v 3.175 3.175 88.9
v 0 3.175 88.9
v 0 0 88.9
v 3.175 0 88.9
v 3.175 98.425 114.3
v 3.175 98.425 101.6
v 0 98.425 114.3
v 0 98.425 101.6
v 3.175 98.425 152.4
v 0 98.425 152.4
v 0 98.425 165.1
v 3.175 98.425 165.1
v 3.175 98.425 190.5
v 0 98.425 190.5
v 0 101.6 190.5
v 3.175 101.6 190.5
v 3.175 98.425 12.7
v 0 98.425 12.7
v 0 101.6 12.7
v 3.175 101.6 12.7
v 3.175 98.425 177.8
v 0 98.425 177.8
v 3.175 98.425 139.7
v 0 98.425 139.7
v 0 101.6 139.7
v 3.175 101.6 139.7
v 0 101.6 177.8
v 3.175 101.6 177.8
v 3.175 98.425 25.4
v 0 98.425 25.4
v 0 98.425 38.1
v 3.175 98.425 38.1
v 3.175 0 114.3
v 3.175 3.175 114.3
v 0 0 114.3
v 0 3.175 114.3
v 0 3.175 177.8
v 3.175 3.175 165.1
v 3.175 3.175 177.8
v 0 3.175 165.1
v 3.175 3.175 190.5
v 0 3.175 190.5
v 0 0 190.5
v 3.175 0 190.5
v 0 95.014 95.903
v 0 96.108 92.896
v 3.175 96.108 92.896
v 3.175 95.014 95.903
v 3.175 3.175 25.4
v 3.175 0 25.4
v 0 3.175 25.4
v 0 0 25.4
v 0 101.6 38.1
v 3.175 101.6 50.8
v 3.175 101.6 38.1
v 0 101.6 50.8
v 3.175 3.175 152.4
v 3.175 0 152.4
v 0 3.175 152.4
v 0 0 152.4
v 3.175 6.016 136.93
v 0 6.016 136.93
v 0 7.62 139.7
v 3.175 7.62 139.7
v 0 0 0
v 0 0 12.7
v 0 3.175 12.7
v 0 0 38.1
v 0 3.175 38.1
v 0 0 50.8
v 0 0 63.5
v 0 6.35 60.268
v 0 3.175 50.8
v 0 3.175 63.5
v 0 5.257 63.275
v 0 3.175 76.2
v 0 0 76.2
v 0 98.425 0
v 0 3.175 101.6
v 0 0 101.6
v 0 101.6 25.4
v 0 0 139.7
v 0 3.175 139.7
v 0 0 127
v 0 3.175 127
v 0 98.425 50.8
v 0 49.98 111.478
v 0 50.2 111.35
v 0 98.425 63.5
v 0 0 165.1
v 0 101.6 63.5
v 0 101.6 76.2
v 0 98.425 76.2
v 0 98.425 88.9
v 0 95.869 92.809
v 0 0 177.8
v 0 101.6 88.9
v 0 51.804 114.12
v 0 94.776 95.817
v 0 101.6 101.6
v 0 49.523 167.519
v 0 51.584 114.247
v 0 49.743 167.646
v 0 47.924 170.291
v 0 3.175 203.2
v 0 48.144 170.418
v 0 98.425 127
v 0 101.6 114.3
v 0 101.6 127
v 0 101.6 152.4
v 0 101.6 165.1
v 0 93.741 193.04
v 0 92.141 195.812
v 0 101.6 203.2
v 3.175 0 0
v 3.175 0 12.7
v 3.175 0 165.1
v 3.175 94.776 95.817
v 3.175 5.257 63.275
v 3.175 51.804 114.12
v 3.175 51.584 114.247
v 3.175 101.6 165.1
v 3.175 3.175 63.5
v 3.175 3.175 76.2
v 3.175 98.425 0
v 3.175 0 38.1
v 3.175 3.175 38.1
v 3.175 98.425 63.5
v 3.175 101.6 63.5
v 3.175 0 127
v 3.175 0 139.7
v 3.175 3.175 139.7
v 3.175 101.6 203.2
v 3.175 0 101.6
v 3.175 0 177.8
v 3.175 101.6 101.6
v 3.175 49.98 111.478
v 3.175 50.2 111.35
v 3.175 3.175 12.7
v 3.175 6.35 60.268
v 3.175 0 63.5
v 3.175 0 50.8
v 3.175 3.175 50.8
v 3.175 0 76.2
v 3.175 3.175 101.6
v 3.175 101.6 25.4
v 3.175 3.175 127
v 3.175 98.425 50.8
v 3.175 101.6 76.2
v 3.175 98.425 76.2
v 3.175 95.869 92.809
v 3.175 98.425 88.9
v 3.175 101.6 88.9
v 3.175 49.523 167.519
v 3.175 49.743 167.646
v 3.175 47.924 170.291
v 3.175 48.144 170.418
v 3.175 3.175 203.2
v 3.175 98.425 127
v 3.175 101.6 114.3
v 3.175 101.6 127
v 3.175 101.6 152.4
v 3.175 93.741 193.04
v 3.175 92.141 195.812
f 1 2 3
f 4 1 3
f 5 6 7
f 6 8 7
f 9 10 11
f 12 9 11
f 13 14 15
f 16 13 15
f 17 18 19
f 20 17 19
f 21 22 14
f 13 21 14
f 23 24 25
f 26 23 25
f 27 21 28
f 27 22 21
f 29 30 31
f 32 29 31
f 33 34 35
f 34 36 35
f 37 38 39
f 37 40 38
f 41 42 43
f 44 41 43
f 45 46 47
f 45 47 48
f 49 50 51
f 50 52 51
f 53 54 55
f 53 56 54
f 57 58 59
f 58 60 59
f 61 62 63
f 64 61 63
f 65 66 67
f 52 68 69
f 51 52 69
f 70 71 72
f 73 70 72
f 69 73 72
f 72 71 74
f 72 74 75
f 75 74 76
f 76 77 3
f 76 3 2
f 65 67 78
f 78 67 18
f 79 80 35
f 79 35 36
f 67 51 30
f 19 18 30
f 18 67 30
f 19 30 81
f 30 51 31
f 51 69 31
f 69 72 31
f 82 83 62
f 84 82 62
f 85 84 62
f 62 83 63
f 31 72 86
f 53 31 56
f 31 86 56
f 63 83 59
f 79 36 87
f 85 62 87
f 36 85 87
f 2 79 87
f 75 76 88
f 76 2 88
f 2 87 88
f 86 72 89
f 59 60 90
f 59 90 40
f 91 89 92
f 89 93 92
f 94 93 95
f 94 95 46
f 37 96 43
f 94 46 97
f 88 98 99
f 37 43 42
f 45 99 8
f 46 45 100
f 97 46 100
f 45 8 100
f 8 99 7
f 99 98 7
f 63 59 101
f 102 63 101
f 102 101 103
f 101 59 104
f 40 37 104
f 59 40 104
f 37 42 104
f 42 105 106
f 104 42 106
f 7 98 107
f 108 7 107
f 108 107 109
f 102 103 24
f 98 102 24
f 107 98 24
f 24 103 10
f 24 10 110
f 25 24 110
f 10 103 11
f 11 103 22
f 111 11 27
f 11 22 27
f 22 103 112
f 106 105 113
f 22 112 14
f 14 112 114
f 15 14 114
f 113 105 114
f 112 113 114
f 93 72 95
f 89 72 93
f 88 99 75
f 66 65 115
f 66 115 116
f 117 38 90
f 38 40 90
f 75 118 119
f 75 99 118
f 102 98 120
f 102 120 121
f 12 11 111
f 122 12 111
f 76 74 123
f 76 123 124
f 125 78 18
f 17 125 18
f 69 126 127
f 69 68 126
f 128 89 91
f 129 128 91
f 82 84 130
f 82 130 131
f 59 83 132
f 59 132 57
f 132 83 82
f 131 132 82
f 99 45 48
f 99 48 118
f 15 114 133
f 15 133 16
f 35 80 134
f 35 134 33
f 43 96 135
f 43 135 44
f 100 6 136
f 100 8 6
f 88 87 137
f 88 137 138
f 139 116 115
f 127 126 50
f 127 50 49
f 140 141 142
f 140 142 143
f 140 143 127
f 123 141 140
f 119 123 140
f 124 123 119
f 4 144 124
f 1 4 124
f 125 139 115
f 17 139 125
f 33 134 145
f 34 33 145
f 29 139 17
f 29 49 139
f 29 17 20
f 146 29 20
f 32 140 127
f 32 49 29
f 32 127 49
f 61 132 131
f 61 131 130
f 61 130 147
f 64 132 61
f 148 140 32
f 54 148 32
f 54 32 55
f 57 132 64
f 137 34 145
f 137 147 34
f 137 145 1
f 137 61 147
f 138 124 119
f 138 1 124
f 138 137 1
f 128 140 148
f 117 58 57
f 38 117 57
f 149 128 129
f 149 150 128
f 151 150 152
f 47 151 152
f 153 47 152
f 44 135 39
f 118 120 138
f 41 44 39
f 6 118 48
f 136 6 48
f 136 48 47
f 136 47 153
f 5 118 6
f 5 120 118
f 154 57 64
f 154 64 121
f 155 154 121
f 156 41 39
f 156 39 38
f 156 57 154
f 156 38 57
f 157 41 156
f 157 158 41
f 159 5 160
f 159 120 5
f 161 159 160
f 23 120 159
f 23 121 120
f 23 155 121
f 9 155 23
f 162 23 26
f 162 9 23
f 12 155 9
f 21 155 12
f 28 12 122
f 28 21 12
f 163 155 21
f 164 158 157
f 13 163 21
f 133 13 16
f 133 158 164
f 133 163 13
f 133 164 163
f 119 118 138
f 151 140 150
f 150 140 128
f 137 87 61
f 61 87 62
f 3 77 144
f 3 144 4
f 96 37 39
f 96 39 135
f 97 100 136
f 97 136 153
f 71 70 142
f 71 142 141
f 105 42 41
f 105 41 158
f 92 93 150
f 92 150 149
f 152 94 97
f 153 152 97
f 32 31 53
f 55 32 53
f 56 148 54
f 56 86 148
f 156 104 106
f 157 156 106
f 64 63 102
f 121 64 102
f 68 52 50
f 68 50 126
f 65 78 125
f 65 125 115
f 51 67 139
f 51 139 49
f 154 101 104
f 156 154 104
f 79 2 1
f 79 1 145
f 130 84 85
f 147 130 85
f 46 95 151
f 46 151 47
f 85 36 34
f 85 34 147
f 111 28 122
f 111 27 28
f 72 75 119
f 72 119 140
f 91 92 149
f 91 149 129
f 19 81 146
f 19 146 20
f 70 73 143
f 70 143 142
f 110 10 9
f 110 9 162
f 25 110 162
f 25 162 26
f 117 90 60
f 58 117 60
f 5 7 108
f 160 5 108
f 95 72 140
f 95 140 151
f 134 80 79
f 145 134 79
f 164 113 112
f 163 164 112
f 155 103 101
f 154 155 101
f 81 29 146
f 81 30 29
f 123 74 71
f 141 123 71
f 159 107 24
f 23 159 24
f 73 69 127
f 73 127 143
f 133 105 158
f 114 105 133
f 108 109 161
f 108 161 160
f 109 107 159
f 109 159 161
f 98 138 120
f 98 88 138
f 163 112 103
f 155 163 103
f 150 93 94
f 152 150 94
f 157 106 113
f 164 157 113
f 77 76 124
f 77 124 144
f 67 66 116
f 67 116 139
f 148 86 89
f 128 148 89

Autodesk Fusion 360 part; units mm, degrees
sketch "Sketch1" plane through (0, 0, 0) normal (1, 0, 0) x (0, 1, 0)
  line L0 (98.425, 139.7) -> (101.6, 139.7)
  line L1 (0, 101.6) -> (0, 114.3)
  line L2 (0, 127) -> (0, 139.7)
  line L3 (98.425, 114.3) -> (101.6, 114.3)
  line L4 (0, 127) -> (3.175, 127)
  line L5 (101.6, 101.6) -> (101.6, 88.9)
  line L6 (0, 101.6) -> (3.175, 101.6)
  line L7 (98.425, 0) -> (98.425, 203.2)
  line L8 (98.425, 114.3) -> (98.425, 101.6)
  line L9 (98.425, 88.9) -> (101.6, 88.9)
  line L10 (101.6, 0) -> (100.0125, 0)
  line L11 (98.425, 127) -> (101.6, 127)
  line L12 (98.425, 101.6) -> (101.6, 101.6)
  line L13 (98.425, 95.25) -> (98.425, 88.9)
  line L14 (3.175, 0) -> (3.175, 203.2)
  line L15 (101.6, 127) -> (101.6, 114.3)
  line L16 (3.175, 127) -> (3.175, 114.3)
  line L17 (3.175, 88.9) -> (0, 88.9)
  line L18 (98.425, 139.7) -> (98.425, 127)
  line L19 (3.175, 114.3) -> (0, 114.3)
  line L20 (3.175, 12.7) -> (3.175, 0)
  line L21 (3.175, 190.5) -> (3.175, 177.8)
  line L22 (3.175, 177.8) -> (0, 177.8)
  line L23 (101.6, 50.8) -> (101.6, 38.1)
  line L24 (3.175, 50.8) -> (3.175, 38.1)
  line L25 (98.425, 152.4) -> (101.6, 152.4)
  line L26 (98.425, 50.8) -> (101.6, 50.8)
  line L27 (98.425, 152.4) -> (98.425, 139.7)
  line L28 (3.175, 139.7) -> (0, 139.7)
  line L29 (0, 139.7) -> (0, 127)
  line L30 (3.175, 101.6) -> (3.175, 88.9)
  line L31 (98.425, 101.6) -> (98.425, 95.25)
  line L32 (98.425, 203.2) -> (98.425, 190.5)
  line L33 (101.6, 152.4) -> (101.6, 139.7)
  line L34 (101.6, 203.2) -> (101.6, 190.5)
  line L35 (3.175, 203.2) -> (3.175, 190.5)
  line L36 (0, 0) -> (11.0998, 0)
  line L37 (98.425, 177.8) -> (98.425, 165.1)
  line L38 (98.425, 127) -> (98.425, 114.3)
  line L39 (0, 165.1) -> (0, 152.4)
  line L40 (11.0998, 0) -> (6.0198, 0)
  line L41 (98.425, 88.9) -> (98.425, 76.2)
  line L42 (0, 38.1) -> (3.175, 38.1)
  line L43 (98.425, 38.1) -> (98.425, 25.4)
  line L44 (101.6, 177.8) -> (101.6, 165.1)
  line L45 (98.425, 12.7) -> (101.6, 12.7)
  line L46 (0, 177.8) -> (0, 190.5)
  line L47 (98.425, 177.8) -> (101.6, 177.8)
  line L48 (0, 76.2) -> (0, 88.9)
  line L49 (0, 114.3) -> (0, 101.6)
  line L50 (3.175, 190.5) -> (0, 190.5)
  line L51 (98.425, 190.5) -> (101.6, 190.5)
  line L52 (101.6, 0) -> (0, 0)
  line L53 (98.425, 38.1) -> (101.6, 38.1)
  line L54 (90.5002, 0) -> (95.5802, 0)
  line L55 (3.175, 203.2) -> (101.6, 203.2)
  line L56 (98.425, 76.2) -> (101.6, 76.2)
  line L57 (98.425, 165.1) -> (101.6, 165.1)
  line L58 (98.425, 63.5) -> (98.425, 50.8)
  line L59 (98.425, 25.4) -> (101.6, 25.4)
  line L60 (0, 0) -> (0, 12.7)
  line L61 (3.175, 63.5) -> (0, 63.5)
  line L62 (98.425, 63.5) -> (101.6, 63.5)
  line L63 (0, 152.4) -> (0, 165.1)
  line L64 (0, 152.4) -> (3.175, 152.4)
  line L65 (0, 25.4) -> (0, 38.1)
  line L66 (0, 0) -> (12.065, 0)
  line L67 (3.175, 50.8) -> (0, 50.8)
  line L68 (101.6, 203.2) -> (98.425, 203.2)
  line L69 (98.425, 190.5) -> (98.425, 177.8)
  line L70 (101.6, 76.2) -> (101.6, 63.5)
  line L71 (101.6, 0) -> (90.5002, 0)
  line L72 (3.175, 25.4) -> (3.175, 12.7)
  line L73 (98.425, 25.4) -> (98.425, 12.7)
  line L74 (3.175, 38.1) -> (3.175, 25.4)
  line L75 (0, 12.7) -> (3.175, 12.7)
  line L76 (0, 50.8) -> (0, 63.5)
  line L77 (0, 25.4) -> (3.175, 25.4)
  line L78 (3.175, 177.8) -> (3.175, 165.1)
  line L79 (101.6, 0) -> (98.425, 0)
  line L80 (101.6, 0) -> (85.725, 0)
  line L81 (101.6, 25.4) -> (101.6, 12.7)
  line L82 (3.175, 76.2) -> (0, 76.2)
  line L83 (98.425, 165.1) -> (98.425, 152.4)
  line L84 (3.175, 63.5) -> (3.175, 50.8)
  line L85 (3.175, 152.4) -> (3.175, 139.7)
  line L86 (98.425, 76.2) -> (98.425, 63.5)
  line L87 (3.175, 165.1) -> (0, 165.1)
  line L88 (98.425, 50.8) -> (98.425, 38.1)
  line L89 (3.175, 76.2) -> (3.175, 63.5)
  line L90 (0, 0) -> (3.175, 0)
  line L91 (3.175, 88.9) -> (3.175, 76.2)
  line L92 (98.425, 203.2) -> (98.425, 177.8)
  line L93 (3.175, 0) -> (3.175, 59.055)
  line L94 (7.62, 139.7) -> (51.5837, 114.2474)
  line L95 (49.9801, 111.4777) -> (6.0165, 136.9303)
  line L96 (6.0165, 136.9303) -> (7.62, 139.7)
  line L97 (93.7411, 193.04) -> (49.7434, 167.6463)
  line L98 (92.1413, 195.8119) -> (93.7411, 193.04)
  line L99 (48.1436, 170.4182) -> (92.1413, 195.8119)
  line L100 (3.175, 60.2676) -> (4.1957, 60.2676)
  line L101 (4.1957, 60.2676) -> (6.35, 60.2676)
  line L102 (6.35, 60.2676) -> (95.8689, 92.8088)
  line L103 (94.7755, 95.8167) -> (5.2566, 63.2754)
  line L104 (49.9801, 111.4777) -> (50.2, 111.3504)
  line L105 (50.2, 111.3504) -> (51.8035, 114.1201)
  line L106 (51.8035, 114.1201) -> (51.5837, 114.2474)
  line L107 (95.8689, 92.8088) -> (96.1076, 92.8956)
  line L108 (96.1076, 92.8956) -> (95.0142, 95.9034)
  line L109 (95.0142, 95.9034) -> (94.7755, 95.8167)
  line L110 (49.7434, 167.6463) -> (49.5234, 167.5194)
  line L111 (49.5234, 167.5194) -> (47.9236, 170.2912)
  line L112 (47.9236, 170.2912) -> (48.1436, 170.4182)
  line L113 (5.2566, 63.2754) -> (6.35, 60.2676)
  dimension "d9" = 11.0998
  dimension "d10" = 11.0998
  dimension "d14" = 5.08
  dimension "d15" = 5.08
  dimension "d27" = 3.175
  dimension "d28" = 3.175
  dimension "d40" = 3.175
  dimension "d41" = 3.175
  dimension "d42" = 12.7
  dimension "d43" = 12.7
  dimension "d44" = 12.7
  dimension "d45" = 12.7
  dimension "d46" = 12.7
  dimension "d47" = 12.7
  dimension "d48" = 12.7
  dimension "d49" = 12.7
  dimension "d50" = 6.35
  dimension "d51" = 6.35
  dimension "d52" = 12.7
  dimension "d53" = 12.7
  dimension "d54" = 12.7
  dimension "d55" = 12.7
  dimension "d56" = 12.7
  dimension "d57" = 12.7
  dimension "d74" = 59.055
  dimension "d78" = 50.8
  dimension "d79" = 3.2004
  dimension "d80" = 50.8
  dimension "d81" = 50.8
  dimension "d82" = 3.2004
  dimension "d83" = 50.8
  dimension "d84" = 95.25
  dimension "d85" = 3.2004
  dimension "d86" = 95.25
  dimension "d87" = 0.254
  dimension "d88" = 0.254
  dimension "d89" = 3.2004
  dimension "d90" = 0.254
  dimension "d91" = 3.2004
extrude "Extrude1" add sketch "Sketch1" along normal blind 3.175
sketch "Sketch2" plane through (0, 0, 0) normal (1, 0, 0) x (0, 1, 0)
equation "d9 = 0.5 in - 0.063 in"
